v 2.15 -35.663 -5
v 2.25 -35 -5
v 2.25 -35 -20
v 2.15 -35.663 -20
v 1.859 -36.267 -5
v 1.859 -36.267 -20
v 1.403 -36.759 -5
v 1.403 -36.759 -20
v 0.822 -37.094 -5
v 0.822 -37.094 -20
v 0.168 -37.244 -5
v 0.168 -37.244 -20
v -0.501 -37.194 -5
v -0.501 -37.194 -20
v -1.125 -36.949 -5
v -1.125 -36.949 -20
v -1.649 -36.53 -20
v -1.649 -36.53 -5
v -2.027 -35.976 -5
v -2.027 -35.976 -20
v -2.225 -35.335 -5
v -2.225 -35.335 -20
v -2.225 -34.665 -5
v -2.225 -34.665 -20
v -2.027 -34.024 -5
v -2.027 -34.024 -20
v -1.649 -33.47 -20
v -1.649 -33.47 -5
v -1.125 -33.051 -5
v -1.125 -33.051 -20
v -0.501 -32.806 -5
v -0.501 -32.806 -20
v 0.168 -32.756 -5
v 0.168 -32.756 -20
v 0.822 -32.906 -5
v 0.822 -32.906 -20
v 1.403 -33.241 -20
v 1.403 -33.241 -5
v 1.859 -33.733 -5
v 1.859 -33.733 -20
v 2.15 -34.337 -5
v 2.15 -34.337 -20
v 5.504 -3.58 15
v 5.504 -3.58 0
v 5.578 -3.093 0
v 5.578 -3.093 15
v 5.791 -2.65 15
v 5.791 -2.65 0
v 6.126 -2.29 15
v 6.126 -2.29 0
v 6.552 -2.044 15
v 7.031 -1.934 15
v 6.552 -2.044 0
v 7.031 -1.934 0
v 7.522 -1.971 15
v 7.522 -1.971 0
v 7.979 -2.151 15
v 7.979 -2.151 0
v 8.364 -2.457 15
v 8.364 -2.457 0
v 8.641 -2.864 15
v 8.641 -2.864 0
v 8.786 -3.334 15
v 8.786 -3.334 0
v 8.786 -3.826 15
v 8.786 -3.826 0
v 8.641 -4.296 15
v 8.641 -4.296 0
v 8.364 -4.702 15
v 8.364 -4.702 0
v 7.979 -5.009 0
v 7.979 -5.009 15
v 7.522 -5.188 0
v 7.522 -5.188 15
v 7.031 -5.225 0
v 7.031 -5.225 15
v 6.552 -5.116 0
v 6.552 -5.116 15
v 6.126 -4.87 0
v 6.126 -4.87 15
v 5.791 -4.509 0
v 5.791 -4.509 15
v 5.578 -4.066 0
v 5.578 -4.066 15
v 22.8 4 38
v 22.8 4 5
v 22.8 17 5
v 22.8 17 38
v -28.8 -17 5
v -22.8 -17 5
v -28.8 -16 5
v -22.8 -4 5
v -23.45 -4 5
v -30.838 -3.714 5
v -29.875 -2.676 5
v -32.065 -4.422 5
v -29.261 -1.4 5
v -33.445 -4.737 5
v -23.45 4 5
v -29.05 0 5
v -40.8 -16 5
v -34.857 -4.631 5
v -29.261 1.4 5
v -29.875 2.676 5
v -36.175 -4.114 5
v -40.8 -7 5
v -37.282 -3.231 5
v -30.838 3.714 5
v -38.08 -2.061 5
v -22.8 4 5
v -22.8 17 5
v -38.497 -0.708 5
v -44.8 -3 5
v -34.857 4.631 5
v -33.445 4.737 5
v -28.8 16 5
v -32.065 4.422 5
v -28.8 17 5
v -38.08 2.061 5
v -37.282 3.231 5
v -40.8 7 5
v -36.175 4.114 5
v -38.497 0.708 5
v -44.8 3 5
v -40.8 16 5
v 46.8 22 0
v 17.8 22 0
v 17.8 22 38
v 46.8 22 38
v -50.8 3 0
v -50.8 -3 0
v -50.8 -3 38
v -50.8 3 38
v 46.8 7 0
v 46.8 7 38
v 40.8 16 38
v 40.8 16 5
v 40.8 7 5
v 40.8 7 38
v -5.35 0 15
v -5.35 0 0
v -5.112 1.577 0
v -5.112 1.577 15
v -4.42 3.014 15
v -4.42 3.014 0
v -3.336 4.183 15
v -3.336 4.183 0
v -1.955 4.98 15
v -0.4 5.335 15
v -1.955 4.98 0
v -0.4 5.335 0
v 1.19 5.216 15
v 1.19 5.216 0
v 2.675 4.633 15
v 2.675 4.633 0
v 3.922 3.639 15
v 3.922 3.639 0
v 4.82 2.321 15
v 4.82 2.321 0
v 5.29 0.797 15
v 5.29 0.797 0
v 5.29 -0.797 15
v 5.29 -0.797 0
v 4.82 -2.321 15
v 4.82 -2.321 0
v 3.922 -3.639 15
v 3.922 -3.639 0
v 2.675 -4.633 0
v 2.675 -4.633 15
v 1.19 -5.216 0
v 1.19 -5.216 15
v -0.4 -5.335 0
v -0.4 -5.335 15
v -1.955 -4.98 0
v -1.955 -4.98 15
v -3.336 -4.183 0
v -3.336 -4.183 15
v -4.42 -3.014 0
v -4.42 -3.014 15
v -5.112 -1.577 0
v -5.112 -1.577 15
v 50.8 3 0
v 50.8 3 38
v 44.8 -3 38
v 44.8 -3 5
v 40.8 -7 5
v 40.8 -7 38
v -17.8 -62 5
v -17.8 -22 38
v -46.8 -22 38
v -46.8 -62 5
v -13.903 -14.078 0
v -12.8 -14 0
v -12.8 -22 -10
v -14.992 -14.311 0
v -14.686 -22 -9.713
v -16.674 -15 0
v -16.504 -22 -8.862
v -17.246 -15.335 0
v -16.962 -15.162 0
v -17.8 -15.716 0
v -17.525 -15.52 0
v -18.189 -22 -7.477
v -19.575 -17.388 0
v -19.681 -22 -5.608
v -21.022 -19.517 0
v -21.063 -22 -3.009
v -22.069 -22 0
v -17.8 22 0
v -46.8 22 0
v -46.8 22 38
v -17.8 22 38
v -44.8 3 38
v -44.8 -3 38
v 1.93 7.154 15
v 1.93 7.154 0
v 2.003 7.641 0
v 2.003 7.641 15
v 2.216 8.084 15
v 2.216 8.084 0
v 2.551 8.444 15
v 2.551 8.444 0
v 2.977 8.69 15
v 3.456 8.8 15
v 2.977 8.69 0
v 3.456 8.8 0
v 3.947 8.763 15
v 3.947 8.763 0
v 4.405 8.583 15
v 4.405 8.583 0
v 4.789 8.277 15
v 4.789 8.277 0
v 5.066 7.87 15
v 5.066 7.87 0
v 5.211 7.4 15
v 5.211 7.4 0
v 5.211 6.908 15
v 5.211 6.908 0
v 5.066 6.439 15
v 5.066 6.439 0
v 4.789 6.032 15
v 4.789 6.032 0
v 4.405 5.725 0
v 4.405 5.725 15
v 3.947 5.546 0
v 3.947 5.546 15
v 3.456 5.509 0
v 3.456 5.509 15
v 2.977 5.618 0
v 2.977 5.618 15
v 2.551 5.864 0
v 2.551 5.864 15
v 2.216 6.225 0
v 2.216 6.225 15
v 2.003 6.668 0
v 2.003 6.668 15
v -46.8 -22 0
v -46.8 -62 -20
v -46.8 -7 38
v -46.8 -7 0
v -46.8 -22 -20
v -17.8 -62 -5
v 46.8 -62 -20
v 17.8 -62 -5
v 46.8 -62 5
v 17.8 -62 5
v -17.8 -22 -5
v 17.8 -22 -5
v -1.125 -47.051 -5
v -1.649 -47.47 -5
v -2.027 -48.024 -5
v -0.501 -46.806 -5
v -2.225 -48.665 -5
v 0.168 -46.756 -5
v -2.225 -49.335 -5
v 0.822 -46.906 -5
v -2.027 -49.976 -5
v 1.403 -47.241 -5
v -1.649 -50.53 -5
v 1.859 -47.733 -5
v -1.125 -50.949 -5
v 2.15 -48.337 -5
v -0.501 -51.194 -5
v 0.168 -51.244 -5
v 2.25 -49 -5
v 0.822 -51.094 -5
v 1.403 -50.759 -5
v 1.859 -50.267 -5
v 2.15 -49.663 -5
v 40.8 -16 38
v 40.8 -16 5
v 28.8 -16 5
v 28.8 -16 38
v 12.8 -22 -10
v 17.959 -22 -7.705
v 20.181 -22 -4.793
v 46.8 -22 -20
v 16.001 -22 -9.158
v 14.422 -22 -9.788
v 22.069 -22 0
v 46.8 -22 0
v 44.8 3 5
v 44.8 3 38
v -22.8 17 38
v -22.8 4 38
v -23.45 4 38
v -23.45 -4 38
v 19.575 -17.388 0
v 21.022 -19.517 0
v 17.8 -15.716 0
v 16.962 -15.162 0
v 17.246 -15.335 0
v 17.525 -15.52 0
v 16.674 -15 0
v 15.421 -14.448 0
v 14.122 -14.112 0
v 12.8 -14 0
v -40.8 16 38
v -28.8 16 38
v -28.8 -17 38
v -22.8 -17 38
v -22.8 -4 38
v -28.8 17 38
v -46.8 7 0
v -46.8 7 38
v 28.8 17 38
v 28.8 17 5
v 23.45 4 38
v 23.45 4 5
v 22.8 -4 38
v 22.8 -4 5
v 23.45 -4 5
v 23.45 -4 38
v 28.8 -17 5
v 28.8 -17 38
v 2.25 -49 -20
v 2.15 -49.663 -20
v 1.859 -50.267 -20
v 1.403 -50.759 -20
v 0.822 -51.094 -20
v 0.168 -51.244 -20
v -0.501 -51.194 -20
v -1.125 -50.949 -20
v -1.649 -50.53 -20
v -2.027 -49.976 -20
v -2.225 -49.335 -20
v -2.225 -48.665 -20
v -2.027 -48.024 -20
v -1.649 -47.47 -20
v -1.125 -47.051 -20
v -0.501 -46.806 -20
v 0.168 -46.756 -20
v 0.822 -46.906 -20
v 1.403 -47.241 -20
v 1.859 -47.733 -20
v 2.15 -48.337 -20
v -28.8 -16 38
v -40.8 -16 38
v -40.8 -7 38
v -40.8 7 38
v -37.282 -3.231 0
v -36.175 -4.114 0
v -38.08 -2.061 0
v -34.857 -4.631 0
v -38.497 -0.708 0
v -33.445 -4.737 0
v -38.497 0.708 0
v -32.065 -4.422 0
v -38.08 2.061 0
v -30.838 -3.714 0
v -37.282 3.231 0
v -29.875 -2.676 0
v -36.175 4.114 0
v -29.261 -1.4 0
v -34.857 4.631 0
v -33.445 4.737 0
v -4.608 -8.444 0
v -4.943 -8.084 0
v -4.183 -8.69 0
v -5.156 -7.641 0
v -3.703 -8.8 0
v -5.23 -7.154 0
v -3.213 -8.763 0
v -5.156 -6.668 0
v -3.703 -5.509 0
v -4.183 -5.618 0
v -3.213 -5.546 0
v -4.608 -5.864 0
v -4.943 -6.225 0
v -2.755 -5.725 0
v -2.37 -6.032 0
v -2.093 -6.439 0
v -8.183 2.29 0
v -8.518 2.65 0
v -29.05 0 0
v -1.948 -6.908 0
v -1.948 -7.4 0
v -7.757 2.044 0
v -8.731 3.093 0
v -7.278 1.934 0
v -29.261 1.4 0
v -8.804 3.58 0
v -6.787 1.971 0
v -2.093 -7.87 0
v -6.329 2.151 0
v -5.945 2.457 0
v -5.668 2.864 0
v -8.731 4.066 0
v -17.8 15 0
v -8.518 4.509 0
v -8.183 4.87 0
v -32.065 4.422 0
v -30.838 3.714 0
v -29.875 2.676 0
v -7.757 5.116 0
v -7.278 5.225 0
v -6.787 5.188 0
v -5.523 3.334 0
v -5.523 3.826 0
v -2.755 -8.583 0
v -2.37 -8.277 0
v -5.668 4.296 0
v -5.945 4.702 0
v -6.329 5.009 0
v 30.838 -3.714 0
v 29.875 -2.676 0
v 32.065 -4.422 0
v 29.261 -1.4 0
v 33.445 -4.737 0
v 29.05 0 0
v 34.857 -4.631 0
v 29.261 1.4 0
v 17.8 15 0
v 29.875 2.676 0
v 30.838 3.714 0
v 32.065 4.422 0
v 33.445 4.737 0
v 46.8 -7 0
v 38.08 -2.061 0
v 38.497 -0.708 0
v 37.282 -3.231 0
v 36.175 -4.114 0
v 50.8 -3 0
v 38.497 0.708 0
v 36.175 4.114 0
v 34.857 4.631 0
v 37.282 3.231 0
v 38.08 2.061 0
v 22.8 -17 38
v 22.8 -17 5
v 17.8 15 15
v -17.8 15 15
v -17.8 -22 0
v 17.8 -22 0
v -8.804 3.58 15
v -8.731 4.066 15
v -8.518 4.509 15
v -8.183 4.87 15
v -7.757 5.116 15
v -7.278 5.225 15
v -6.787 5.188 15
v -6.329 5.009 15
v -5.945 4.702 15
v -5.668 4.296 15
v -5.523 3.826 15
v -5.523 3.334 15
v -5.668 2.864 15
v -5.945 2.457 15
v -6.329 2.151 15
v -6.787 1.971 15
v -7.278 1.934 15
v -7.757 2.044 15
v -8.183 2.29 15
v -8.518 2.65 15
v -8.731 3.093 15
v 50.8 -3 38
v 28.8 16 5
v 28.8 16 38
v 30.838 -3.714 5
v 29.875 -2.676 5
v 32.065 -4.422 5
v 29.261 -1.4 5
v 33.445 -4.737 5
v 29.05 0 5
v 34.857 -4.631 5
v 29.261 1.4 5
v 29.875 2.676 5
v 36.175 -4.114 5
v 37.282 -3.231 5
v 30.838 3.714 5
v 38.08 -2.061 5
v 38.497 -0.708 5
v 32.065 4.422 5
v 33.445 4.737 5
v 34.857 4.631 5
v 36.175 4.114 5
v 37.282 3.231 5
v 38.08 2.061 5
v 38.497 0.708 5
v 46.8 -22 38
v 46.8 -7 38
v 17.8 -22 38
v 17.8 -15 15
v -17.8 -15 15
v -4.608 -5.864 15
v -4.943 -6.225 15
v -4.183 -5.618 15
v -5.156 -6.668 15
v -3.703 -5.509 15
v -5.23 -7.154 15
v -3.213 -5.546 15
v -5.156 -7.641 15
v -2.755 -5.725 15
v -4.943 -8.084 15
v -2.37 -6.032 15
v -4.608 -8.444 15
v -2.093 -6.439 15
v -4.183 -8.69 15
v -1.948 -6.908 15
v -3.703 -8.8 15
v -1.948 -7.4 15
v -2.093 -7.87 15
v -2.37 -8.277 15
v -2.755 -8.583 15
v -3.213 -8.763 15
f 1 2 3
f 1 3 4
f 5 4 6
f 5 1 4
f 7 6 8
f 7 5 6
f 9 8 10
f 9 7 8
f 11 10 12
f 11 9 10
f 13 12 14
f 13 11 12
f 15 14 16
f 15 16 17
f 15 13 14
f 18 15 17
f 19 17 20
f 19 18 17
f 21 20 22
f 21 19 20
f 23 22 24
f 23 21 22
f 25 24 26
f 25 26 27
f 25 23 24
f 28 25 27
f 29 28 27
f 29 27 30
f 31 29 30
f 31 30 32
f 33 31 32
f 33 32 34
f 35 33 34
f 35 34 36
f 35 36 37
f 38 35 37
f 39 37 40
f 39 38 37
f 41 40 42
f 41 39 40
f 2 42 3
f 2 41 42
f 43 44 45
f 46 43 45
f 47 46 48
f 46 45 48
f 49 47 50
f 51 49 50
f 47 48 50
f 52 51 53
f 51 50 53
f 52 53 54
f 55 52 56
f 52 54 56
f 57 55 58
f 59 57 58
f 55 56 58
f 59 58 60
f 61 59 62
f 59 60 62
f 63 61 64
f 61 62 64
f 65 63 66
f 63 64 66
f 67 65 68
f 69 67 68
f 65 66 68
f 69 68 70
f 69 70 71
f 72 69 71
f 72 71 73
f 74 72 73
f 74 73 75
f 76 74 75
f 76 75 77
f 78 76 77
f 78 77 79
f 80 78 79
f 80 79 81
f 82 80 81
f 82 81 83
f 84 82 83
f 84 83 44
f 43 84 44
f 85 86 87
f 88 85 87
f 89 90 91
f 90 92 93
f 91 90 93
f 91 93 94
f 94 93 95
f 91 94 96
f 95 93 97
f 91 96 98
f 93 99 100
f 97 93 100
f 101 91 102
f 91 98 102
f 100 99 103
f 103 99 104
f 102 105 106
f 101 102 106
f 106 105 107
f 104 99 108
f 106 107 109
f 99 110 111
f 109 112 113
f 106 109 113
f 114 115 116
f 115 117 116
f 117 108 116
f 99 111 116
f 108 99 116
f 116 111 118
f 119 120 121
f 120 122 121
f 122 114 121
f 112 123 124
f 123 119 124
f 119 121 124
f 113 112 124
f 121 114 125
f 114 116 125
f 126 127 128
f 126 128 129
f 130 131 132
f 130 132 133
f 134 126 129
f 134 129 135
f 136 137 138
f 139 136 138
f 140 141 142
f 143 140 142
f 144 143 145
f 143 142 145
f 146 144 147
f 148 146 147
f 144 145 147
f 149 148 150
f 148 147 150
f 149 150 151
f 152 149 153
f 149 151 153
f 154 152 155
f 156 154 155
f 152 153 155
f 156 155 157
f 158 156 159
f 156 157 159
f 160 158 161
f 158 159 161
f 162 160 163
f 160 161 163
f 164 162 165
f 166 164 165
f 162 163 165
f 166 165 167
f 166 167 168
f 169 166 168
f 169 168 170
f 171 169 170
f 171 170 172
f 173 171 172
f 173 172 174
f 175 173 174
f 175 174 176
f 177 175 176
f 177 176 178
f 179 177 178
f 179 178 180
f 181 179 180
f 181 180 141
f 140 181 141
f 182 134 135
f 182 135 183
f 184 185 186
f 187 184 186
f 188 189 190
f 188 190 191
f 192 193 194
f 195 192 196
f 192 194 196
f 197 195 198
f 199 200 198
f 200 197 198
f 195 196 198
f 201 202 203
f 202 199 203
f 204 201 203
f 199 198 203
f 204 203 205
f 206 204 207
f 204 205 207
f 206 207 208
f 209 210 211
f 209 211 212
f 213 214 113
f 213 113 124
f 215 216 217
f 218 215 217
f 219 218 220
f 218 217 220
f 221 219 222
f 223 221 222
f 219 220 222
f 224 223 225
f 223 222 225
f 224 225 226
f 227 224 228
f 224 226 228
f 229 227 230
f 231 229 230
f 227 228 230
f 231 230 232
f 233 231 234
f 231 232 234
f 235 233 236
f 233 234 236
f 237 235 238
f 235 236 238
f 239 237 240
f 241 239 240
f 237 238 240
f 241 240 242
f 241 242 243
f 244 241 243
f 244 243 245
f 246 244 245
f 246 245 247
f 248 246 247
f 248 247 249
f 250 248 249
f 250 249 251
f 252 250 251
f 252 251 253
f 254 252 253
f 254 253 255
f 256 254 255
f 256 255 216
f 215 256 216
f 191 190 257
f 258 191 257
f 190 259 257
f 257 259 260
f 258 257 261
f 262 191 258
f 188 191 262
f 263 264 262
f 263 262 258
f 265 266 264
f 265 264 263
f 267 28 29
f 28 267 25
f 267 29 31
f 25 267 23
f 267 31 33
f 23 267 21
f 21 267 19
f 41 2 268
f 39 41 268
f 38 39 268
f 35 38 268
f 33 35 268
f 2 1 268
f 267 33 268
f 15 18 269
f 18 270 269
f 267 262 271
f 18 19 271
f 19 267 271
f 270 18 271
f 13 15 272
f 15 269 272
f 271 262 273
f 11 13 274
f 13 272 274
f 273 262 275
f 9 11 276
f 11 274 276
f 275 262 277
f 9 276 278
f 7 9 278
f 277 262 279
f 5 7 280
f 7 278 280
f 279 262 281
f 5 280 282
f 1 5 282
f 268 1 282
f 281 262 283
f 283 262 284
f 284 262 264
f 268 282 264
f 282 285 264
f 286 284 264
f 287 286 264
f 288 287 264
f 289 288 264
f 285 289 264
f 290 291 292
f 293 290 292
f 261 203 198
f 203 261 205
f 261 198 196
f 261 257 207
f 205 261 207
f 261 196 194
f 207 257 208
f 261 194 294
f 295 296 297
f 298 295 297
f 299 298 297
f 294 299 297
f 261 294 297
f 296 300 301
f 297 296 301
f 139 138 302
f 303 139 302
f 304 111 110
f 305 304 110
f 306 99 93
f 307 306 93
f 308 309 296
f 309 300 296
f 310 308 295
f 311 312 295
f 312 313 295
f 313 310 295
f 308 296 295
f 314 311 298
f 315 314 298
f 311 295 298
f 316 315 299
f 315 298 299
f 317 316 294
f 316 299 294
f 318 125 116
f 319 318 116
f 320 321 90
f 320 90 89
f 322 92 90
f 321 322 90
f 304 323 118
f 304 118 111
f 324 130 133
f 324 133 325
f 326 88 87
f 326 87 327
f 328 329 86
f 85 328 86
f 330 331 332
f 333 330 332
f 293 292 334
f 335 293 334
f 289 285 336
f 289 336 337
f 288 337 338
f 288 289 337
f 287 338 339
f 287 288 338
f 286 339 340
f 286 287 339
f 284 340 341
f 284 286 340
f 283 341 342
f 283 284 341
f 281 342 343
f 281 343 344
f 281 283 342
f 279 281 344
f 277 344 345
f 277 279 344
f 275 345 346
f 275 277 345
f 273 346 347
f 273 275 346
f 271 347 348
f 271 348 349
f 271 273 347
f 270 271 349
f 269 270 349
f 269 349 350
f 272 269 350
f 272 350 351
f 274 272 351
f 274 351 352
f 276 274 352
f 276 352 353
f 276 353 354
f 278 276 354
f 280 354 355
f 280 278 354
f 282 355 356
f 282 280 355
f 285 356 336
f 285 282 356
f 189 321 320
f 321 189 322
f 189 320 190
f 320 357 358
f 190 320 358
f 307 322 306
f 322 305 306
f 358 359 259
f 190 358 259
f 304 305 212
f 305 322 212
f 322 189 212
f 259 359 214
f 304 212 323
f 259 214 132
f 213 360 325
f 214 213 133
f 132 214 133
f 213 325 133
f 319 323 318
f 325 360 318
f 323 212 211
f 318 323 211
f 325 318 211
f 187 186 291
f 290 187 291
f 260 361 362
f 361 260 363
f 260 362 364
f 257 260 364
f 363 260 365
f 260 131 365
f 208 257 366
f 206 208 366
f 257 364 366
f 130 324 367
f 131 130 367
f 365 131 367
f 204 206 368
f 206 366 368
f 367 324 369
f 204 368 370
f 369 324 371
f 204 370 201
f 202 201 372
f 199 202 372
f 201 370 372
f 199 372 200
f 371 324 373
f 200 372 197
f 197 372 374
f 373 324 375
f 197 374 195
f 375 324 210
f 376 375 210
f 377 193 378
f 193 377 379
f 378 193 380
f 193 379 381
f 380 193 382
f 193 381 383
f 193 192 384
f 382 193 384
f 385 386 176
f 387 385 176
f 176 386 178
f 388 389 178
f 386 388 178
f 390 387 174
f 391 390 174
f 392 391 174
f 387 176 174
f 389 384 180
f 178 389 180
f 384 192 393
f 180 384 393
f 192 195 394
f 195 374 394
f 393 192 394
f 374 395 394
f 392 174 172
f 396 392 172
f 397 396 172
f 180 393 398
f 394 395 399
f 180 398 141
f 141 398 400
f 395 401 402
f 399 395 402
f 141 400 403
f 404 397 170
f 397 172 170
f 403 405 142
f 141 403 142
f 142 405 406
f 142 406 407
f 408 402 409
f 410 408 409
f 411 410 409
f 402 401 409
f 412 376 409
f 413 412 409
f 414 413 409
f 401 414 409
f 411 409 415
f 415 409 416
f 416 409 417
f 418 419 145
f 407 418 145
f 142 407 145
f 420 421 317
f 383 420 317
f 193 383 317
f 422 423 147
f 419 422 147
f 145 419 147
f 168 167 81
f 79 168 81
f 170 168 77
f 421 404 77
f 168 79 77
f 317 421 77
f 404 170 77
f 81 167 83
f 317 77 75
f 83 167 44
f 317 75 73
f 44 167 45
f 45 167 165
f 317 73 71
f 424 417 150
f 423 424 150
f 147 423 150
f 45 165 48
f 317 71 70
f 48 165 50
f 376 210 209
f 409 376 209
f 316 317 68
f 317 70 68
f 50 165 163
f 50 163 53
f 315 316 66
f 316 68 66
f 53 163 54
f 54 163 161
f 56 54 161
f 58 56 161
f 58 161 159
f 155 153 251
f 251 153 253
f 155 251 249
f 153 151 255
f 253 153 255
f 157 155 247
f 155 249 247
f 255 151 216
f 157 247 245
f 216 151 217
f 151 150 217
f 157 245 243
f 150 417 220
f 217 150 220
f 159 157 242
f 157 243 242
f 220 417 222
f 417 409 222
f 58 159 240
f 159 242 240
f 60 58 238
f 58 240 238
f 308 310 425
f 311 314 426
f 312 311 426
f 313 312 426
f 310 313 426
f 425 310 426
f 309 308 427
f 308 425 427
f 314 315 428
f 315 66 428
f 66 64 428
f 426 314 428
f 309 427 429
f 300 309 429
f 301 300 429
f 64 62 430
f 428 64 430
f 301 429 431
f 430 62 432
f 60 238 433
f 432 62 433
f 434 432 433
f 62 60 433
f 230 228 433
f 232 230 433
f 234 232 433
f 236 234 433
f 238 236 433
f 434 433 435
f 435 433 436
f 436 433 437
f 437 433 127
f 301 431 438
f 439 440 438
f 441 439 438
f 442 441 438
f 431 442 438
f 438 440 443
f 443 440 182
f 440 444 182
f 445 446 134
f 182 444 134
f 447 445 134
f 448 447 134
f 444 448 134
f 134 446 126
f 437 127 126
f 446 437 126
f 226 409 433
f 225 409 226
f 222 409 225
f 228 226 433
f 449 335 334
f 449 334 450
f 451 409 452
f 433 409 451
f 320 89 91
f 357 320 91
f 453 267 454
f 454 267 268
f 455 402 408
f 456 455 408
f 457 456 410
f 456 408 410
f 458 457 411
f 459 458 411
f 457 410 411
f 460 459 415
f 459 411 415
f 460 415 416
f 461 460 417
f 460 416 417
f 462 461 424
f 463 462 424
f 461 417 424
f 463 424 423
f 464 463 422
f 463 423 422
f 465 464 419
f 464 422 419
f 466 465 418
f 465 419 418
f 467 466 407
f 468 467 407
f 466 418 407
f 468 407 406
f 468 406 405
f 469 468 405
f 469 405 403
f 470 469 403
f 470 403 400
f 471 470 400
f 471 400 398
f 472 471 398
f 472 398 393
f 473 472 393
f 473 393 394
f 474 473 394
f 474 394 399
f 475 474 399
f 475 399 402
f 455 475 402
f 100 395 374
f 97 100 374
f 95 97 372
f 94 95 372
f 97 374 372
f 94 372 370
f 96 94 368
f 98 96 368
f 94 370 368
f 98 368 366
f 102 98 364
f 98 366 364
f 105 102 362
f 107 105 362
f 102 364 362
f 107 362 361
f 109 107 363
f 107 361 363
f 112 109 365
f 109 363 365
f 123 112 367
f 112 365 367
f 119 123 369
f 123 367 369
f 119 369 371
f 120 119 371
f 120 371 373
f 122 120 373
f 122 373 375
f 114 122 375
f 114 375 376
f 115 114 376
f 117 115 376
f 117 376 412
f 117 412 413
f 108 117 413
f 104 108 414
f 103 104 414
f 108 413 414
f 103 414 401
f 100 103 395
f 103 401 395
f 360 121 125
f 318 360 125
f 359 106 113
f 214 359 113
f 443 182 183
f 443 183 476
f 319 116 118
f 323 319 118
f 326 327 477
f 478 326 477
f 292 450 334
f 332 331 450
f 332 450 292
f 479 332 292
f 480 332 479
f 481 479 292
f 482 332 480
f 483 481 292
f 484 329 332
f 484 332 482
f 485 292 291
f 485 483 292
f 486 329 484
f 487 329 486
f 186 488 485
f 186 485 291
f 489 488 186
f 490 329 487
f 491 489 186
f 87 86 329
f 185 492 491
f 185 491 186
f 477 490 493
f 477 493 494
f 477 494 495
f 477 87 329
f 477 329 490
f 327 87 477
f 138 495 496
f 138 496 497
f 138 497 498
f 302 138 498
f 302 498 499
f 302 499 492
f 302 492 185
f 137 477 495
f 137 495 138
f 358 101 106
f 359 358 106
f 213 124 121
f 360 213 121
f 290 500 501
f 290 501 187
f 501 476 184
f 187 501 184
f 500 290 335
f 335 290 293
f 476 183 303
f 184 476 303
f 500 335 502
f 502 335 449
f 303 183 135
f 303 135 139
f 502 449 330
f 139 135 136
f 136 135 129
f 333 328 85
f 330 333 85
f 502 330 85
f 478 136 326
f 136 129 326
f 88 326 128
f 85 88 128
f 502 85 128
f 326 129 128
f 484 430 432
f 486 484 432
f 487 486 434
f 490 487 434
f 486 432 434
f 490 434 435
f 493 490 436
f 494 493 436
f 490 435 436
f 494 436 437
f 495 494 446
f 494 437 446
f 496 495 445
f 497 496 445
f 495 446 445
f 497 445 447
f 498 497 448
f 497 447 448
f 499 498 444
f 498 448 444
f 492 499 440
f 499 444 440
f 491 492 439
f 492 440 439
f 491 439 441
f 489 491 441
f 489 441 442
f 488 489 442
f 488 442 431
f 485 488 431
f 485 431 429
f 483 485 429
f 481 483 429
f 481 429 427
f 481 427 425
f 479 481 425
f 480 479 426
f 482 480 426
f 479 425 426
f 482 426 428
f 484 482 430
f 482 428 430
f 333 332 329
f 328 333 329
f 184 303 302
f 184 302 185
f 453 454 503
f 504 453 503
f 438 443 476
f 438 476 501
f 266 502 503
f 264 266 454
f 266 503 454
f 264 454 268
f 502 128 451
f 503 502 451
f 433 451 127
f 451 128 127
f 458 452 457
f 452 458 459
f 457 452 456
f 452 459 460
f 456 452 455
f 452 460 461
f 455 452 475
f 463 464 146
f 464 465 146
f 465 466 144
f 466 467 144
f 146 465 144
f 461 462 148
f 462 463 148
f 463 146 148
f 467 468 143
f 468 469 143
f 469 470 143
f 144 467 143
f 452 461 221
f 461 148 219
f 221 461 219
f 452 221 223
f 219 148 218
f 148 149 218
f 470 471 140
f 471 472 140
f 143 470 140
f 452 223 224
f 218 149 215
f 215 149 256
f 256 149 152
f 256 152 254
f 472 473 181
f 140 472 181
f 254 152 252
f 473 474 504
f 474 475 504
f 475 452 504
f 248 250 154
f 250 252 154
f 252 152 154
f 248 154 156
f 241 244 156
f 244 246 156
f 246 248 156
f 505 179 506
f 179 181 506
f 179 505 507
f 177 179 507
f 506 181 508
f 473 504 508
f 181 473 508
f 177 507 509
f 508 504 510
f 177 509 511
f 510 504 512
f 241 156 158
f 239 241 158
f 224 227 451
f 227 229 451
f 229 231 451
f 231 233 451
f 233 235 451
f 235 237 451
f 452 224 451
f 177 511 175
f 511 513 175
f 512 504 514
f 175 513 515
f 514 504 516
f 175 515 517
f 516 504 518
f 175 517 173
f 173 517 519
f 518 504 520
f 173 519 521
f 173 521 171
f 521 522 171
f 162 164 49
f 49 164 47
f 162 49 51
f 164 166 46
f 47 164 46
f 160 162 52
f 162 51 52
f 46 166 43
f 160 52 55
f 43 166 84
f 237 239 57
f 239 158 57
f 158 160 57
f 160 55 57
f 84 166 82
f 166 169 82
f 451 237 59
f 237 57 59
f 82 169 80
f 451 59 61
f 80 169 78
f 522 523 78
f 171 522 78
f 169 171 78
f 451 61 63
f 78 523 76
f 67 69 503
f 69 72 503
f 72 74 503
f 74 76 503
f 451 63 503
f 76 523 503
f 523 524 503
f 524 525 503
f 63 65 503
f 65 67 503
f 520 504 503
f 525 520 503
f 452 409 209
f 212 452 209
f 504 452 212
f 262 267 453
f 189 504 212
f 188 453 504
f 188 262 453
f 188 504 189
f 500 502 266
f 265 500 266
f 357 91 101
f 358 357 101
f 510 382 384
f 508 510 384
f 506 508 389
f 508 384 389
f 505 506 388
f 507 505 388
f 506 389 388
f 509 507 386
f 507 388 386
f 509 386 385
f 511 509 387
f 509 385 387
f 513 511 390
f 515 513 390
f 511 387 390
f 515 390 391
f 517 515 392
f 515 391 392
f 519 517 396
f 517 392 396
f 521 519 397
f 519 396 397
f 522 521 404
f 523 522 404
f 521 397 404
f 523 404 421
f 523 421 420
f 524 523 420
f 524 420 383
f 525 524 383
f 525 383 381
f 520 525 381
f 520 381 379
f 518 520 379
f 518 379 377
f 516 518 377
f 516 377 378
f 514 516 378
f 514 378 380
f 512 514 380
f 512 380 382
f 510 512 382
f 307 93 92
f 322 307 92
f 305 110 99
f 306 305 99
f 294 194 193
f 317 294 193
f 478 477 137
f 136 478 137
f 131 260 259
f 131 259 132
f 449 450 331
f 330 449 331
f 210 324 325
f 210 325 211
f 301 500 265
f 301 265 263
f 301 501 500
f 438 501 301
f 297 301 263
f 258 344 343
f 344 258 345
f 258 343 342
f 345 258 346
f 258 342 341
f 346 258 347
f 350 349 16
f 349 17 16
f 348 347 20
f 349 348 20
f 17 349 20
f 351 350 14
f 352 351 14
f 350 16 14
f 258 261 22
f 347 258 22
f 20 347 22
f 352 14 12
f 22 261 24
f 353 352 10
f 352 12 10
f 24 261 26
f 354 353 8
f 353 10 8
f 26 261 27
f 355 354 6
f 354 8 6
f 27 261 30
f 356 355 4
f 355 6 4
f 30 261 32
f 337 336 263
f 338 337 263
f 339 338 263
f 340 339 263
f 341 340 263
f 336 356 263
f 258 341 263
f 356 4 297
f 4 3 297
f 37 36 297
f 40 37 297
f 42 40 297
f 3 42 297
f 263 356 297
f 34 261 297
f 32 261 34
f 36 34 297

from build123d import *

# Parameters (mm, degrees)
CROQUIS1_R               = 6
SALIENTE_EXTRUIR1_DEPTH  = 38
CROQUIS4_R               = 4.75
SALIENTE_EXTRUIR3_DEPTH  = 5
CROQUIS7_R               = 6
CROQUIS7_R_2             = 5.35
SALIENTE_EXTRUIR4_DEPTH  = 38
CROQUIS8_R               = 1.65
CORTAR_EXTRUIR3_DEPTH    = 38
CROQUIS9_W               = 35.6
CROQUIS9_H               = 23
CORTAR_EXTRUIR4_DEPTH    = 74.441405215
CROQUIS10_W              = 93.6
CROQUIS10_H              = 5
SALIENTE_EXTRUIR5_DEPTH  = 40
CROQUIS11_R              = 2.25
CORTAR_EXTRUIR5_DEPTH    = 87.681255182
CROQUIS14_R              = 2.25
SALIENTE_EXTRUIR6_DEPTH  = 20
SALIENTE_EXTRUIR7_START  = -29
SALIENTE_EXTRUIR7_DEPTH  = 29
SALIENTE_EXTRUIR8_START  = -29
SALIENTE_EXTRUIR8_DEPTH  = 29
CROQUIS17_W              = 35.6
CROQUIS17_H              = 10
CORTAR_EXTRUIR6_DEPTH    = 40
CROQUIS23_W              = 45.6
CROQUIS23_H              = 10
SALIENTE_EXTRUIR11_DEPTH = 8
CORTAR_EXTRUIR7_DEPTH    = 104.464776615
REDONDEO4_R              = 10
SALIENTE_EXTRUIR12_DEPTH = 35.6


with BuildPart() as part:
    # Croquis1 → Saliente-Extruir1 (new body)
    with BuildSketch(Plane.XY):
        Polygon((-50.8, -3), (-50.8, 3), (-46.8, 7), (-46.8, 22), (-17.8, 22), (-17.8, 15), (17.8, 15), (17.8, 22), (46.8, 22), (46.8, 7), (50.8, 3), (50.8, -3), (46.8, -7), (46.8, -22), (17.8, -22), (17.8, -15), (-17.8, -15), (-17.8, -22), (-46.8, -22), (-46.8, -7), align=None)
        Circle(CROQUIS1_R, mode=Mode.SUBTRACT)
        Polygon((-22.8, 4), (-23.45, 4), (-23.45, -4), (-22.8, -4), (-22.8, -17), (-28.8, -17), (-28.8, -16), (-40.8, -16), (-40.8, -7), (-44.8, -3), (-44.8, 3), (-40.8, 7), (-40.8, 16), (-28.8, 16), (-28.8, 17), (-22.8, 17), align=None, mode=Mode.SUBTRACT)
        Polygon((23.45, -4), (23.45, 4), (22.8, 4), (22.8, 17), (28.8, 17), (28.8, 16), (40.8, 16), (40.8, 7), (44.8, 3), (44.8, -3), (40.8, -7), (40.8, -16), (28.8, -16), (28.8, -17), (22.8, -17), (22.8, -4), align=None, mode=Mode.SUBTRACT)
    extrude(amount=SALIENTE_EXTRUIR1_DEPTH)

    # Croquis4 → Saliente-Extruir3 (add)
    # profile 1 of 2: a face of its own
    with BuildSketch(Plane(origin=(0, 0, 0), x_dir=(-1, 0, 0), z_dir=(0, 0, -1))):
        Polygon((-40.8, 16), (-28.8, 16), (-28.8, 17), (-22.8, 17), (-22.8, 4), (-23.45, 4), (-23.45, -4), (-22.8, -4), (-22.8, -17), (-28.8, -17), (-28.8, -16), (-40.8, -16), (-40.8, -7), (-44.8, -3), (-44.8, 3), (-40.8, 7), align=None)
        with Locations((-33.8, 0)):
            Circle(CROQUIS4_R, mode=Mode.SUBTRACT)
    # profile 2 of 2: a face of its own
    with BuildSketch(Plane(origin=(0, 0, 0), x_dir=(-1, 0, 0), z_dir=(0, 0, -1))):
        Polygon((40.8, 7), (40.8, 16), (28.8, 16), (28.8, 17), (22.8, 17), (22.8, 4), (23.45, 4), (23.45, -4), (22.8, -4), (22.8, -17), (28.8, -17), (28.8, -16), (40.8, -16), (40.8, -7), (44.8, -3), (44.8, 3), align=None)
        with Locations(Location((33.8, 0, 0), (0, 0, 180))):
            Circle(CROQUIS4_R, mode=Mode.SUBTRACT)
    extrude(amount=-SALIENTE_EXTRUIR3_DEPTH)

    # Croquis7 → Saliente-Extruir4 (add)
    with BuildSketch(Plane(origin=(0, 0, 0), x_dir=(-1, 0, 0), z_dir=(0, 0, -1))):
        Circle(CROQUIS7_R)
        Circle(CROQUIS7_R_2, mode=Mode.SUBTRACT)
    extrude(amount=-SALIENTE_EXTRUIR4_DEPTH)

    # Croquis8 → Cortar-Extruir3 (cut)
    with BuildSketch(Plane(origin=(0, 0, 0), x_dir=(-1, 0, 0), z_dir=(0, 0, -1))):
        with Locations((-7.15441776, -3.579707868)):
            Circle(CROQUIS8_R)
        with Locations((3.579707868, -7.15441776)):
            Circle(CROQUIS8_R)
        with Locations((7.15441776, 3.579707868)):
            Circle(CROQUIS8_R)
        with Locations((-3.579707868, 7.15441776)):
            Circle(CROQUIS8_R)
    extrude(amount=-CORTAR_EXTRUIR3_DEPTH, mode=Mode.SUBTRACT)

    # Croquis9 → Cortar-Extruir4 (cut, through all)
    with BuildSketch(Plane.XZ.offset(15)):
        with Locations((0, 26.5)):
            Rectangle(CROQUIS9_W, CROQUIS9_H)
    extrude(amount=-CORTAR_EXTRUIR4_DEPTH, mode=Mode.SUBTRACT)

    # Croquis10 → Saliente-Extruir5 (add)
    with BuildSketch(Plane.XZ.offset(22)):
        with Locations((0, 2.5)):
            Rectangle(CROQUIS10_W, CROQUIS10_H)
    extrude(amount=SALIENTE_EXTRUIR5_DEPTH)

    # Croquis11 → Cortar-Extruir5 (cut, through all)
    with BuildSketch(Plane.XY.offset(5)):
        with Locations((0, -35)):
            Circle(CROQUIS11_R)
        with Locations((0, -49)):
            Circle(CROQUIS11_R)
    extrude(amount=-CORTAR_EXTRUIR5_DEPTH, mode=Mode.SUBTRACT)

    # Croquis14 → Saliente-Extruir6 (add)
    with BuildSketch(Plane(origin=(0, 0, 0), x_dir=(-1, 0, 0), z_dir=(0, 0, -1))):
        Polygon((17.8, -22), (46.8, -22), (46.8, -62), (-46.8, -62), (-46.8, -22), align=None)
        with Locations(Location((0, -35, 0), (0, 0, 180))):
            Circle(CROQUIS14_R, mode=Mode.SUBTRACT)
        with Locations(Location((0, -49, 0), (0, 0, 180))):
            Circle(CROQUIS14_R, mode=Mode.SUBTRACT)
    extrude(amount=SALIENTE_EXTRUIR6_DEPTH)

    # Croquis15 → Saliente-Extruir7 (add)
    with BuildSketch(Plane.ZY.offset(46.8).offset(SALIENTE_EXTRUIR7_START)):
        Polygon((38, -22), (5, -62), (5, -22), align=None)
    extrude(amount=SALIENTE_EXTRUIR7_DEPTH)

    # Croquis16 → Saliente-Extruir8 (add)
    with BuildSketch(Plane(origin=(46.8, 0, 0), x_dir=(0, 0, -1), z_dir=(1, 0, 0)).offset(SALIENTE_EXTRUIR8_START)):
        Polygon((-38, -22), (-5, -62), (-5, -22), align=None)
    extrude(amount=SALIENTE_EXTRUIR8_DEPTH)

    # Croquis17 → Cortar-Extruir6 (cut)
    with BuildSketch(Plane.XZ.offset(62)):
        Rectangle(CROQUIS17_W, CROQUIS17_H)
    extrude(amount=-CORTAR_EXTRUIR6_DEPTH, mode=Mode.SUBTRACT)

    # Croquis23 → Saliente-Extruir11 (add)
    with BuildSketch(Plane(origin=(0, -22, 0), x_dir=(1, 0, 0), z_dir=(0, 1, 0))):
        with Locations((0, 5)):
            Rectangle(CROQUIS23_W, CROQUIS23_H)
    extrude(amount=SALIENTE_EXTRUIR11_DEPTH)

    # Croquis24 → Cortar-Extruir7 (cut, through all)
    with BuildSketch(Plane.ZY.offset(22.8)):
        Polygon((-10, -22), (0, -14), (-10, -14), align=None)
    extrude(amount=-CORTAR_EXTRUIR7_DEPTH, mode=Mode.SUBTRACT)

    # Redondeo4
    # the kernel refuses this fillet: 10 mm, written as the material it takes off along each edge
    with BuildSketch(Plane(origin=(-22.8, -37.617376189, -29.521720236), x_dir=(1, 0, 0), z_dir=(0, 0.6246950475544245, 0.7808688094430302))) as redondeo4_piece_1_section:
        with BuildLine():
            CenterArc((REDONDEO4_R, -REDONDEO4_R), REDONDEO4_R, 90, 90)
            Line((0, -REDONDEO4_R), (0, 0))
            Line((0, 0), (REDONDEO4_R, 0))
        make_face()
    redondeo4_piece_1 = extrude(amount=62.806248475, mode=Mode.PRIVATE)
    redondeo4_piece_1 = split(redondeo4_piece_1, bisect_by=Plane(origin=(-20.122466275, -22, -4.721973229), z_dir=(0, 1, 0)), keep=Keep.TOP, mode=Mode.PRIVATE)
    redondeo4_piece_1 = split(redondeo4_piece_1, bisect_by=Plane(origin=(-20.122466275, -19.662128578, 0), z_dir=(0, 0, -1)), keep=Keep.TOP, mode=Mode.PRIVATE)
    add(redondeo4_piece_1, mode=Mode.SUBTRACT)
    with BuildSketch(Plane(origin=(22.8, -37.617376189, -29.521720236), x_dir=(0, -0.7808688094430302, 0.6246950475544245), z_dir=(0, 0.6246950475544245, 0.7808688094430302))) as redondeo4_piece_2_section:
        with BuildLine():
            CenterArc((REDONDEO4_R, -REDONDEO4_R), REDONDEO4_R, 90, 90)
            Line((0, -REDONDEO4_R), (0, 0))
            Line((0, 0), (REDONDEO4_R, 0))
        make_face()
    redondeo4_piece_2 = extrude(amount=62.806248475, mode=Mode.PRIVATE)
    redondeo4_piece_2 = split(redondeo4_piece_2, bisect_by=Plane(origin=(20.122466276, -22, -4.72197323), z_dir=(0, 1, 0)), keep=Keep.TOP, mode=Mode.PRIVATE)
    redondeo4_piece_2 = split(redondeo4_piece_2, bisect_by=Plane(origin=(20.122466276, -19.662128579, 0), z_dir=(0, 0, -1)), keep=Keep.TOP, mode=Mode.PRIVATE)
    add(redondeo4_piece_2, mode=Mode.SUBTRACT)

    # Croquis25 → Saliente-Extruir12 (add)
    with BuildSketch(Plane.ZY.offset(-17.8)):
        Polygon((0, -22), (15, -15), (0, -15), align=None)
    extrude(amount=SALIENTE_EXTRUIR12_DEPTH)


solid = part.part
